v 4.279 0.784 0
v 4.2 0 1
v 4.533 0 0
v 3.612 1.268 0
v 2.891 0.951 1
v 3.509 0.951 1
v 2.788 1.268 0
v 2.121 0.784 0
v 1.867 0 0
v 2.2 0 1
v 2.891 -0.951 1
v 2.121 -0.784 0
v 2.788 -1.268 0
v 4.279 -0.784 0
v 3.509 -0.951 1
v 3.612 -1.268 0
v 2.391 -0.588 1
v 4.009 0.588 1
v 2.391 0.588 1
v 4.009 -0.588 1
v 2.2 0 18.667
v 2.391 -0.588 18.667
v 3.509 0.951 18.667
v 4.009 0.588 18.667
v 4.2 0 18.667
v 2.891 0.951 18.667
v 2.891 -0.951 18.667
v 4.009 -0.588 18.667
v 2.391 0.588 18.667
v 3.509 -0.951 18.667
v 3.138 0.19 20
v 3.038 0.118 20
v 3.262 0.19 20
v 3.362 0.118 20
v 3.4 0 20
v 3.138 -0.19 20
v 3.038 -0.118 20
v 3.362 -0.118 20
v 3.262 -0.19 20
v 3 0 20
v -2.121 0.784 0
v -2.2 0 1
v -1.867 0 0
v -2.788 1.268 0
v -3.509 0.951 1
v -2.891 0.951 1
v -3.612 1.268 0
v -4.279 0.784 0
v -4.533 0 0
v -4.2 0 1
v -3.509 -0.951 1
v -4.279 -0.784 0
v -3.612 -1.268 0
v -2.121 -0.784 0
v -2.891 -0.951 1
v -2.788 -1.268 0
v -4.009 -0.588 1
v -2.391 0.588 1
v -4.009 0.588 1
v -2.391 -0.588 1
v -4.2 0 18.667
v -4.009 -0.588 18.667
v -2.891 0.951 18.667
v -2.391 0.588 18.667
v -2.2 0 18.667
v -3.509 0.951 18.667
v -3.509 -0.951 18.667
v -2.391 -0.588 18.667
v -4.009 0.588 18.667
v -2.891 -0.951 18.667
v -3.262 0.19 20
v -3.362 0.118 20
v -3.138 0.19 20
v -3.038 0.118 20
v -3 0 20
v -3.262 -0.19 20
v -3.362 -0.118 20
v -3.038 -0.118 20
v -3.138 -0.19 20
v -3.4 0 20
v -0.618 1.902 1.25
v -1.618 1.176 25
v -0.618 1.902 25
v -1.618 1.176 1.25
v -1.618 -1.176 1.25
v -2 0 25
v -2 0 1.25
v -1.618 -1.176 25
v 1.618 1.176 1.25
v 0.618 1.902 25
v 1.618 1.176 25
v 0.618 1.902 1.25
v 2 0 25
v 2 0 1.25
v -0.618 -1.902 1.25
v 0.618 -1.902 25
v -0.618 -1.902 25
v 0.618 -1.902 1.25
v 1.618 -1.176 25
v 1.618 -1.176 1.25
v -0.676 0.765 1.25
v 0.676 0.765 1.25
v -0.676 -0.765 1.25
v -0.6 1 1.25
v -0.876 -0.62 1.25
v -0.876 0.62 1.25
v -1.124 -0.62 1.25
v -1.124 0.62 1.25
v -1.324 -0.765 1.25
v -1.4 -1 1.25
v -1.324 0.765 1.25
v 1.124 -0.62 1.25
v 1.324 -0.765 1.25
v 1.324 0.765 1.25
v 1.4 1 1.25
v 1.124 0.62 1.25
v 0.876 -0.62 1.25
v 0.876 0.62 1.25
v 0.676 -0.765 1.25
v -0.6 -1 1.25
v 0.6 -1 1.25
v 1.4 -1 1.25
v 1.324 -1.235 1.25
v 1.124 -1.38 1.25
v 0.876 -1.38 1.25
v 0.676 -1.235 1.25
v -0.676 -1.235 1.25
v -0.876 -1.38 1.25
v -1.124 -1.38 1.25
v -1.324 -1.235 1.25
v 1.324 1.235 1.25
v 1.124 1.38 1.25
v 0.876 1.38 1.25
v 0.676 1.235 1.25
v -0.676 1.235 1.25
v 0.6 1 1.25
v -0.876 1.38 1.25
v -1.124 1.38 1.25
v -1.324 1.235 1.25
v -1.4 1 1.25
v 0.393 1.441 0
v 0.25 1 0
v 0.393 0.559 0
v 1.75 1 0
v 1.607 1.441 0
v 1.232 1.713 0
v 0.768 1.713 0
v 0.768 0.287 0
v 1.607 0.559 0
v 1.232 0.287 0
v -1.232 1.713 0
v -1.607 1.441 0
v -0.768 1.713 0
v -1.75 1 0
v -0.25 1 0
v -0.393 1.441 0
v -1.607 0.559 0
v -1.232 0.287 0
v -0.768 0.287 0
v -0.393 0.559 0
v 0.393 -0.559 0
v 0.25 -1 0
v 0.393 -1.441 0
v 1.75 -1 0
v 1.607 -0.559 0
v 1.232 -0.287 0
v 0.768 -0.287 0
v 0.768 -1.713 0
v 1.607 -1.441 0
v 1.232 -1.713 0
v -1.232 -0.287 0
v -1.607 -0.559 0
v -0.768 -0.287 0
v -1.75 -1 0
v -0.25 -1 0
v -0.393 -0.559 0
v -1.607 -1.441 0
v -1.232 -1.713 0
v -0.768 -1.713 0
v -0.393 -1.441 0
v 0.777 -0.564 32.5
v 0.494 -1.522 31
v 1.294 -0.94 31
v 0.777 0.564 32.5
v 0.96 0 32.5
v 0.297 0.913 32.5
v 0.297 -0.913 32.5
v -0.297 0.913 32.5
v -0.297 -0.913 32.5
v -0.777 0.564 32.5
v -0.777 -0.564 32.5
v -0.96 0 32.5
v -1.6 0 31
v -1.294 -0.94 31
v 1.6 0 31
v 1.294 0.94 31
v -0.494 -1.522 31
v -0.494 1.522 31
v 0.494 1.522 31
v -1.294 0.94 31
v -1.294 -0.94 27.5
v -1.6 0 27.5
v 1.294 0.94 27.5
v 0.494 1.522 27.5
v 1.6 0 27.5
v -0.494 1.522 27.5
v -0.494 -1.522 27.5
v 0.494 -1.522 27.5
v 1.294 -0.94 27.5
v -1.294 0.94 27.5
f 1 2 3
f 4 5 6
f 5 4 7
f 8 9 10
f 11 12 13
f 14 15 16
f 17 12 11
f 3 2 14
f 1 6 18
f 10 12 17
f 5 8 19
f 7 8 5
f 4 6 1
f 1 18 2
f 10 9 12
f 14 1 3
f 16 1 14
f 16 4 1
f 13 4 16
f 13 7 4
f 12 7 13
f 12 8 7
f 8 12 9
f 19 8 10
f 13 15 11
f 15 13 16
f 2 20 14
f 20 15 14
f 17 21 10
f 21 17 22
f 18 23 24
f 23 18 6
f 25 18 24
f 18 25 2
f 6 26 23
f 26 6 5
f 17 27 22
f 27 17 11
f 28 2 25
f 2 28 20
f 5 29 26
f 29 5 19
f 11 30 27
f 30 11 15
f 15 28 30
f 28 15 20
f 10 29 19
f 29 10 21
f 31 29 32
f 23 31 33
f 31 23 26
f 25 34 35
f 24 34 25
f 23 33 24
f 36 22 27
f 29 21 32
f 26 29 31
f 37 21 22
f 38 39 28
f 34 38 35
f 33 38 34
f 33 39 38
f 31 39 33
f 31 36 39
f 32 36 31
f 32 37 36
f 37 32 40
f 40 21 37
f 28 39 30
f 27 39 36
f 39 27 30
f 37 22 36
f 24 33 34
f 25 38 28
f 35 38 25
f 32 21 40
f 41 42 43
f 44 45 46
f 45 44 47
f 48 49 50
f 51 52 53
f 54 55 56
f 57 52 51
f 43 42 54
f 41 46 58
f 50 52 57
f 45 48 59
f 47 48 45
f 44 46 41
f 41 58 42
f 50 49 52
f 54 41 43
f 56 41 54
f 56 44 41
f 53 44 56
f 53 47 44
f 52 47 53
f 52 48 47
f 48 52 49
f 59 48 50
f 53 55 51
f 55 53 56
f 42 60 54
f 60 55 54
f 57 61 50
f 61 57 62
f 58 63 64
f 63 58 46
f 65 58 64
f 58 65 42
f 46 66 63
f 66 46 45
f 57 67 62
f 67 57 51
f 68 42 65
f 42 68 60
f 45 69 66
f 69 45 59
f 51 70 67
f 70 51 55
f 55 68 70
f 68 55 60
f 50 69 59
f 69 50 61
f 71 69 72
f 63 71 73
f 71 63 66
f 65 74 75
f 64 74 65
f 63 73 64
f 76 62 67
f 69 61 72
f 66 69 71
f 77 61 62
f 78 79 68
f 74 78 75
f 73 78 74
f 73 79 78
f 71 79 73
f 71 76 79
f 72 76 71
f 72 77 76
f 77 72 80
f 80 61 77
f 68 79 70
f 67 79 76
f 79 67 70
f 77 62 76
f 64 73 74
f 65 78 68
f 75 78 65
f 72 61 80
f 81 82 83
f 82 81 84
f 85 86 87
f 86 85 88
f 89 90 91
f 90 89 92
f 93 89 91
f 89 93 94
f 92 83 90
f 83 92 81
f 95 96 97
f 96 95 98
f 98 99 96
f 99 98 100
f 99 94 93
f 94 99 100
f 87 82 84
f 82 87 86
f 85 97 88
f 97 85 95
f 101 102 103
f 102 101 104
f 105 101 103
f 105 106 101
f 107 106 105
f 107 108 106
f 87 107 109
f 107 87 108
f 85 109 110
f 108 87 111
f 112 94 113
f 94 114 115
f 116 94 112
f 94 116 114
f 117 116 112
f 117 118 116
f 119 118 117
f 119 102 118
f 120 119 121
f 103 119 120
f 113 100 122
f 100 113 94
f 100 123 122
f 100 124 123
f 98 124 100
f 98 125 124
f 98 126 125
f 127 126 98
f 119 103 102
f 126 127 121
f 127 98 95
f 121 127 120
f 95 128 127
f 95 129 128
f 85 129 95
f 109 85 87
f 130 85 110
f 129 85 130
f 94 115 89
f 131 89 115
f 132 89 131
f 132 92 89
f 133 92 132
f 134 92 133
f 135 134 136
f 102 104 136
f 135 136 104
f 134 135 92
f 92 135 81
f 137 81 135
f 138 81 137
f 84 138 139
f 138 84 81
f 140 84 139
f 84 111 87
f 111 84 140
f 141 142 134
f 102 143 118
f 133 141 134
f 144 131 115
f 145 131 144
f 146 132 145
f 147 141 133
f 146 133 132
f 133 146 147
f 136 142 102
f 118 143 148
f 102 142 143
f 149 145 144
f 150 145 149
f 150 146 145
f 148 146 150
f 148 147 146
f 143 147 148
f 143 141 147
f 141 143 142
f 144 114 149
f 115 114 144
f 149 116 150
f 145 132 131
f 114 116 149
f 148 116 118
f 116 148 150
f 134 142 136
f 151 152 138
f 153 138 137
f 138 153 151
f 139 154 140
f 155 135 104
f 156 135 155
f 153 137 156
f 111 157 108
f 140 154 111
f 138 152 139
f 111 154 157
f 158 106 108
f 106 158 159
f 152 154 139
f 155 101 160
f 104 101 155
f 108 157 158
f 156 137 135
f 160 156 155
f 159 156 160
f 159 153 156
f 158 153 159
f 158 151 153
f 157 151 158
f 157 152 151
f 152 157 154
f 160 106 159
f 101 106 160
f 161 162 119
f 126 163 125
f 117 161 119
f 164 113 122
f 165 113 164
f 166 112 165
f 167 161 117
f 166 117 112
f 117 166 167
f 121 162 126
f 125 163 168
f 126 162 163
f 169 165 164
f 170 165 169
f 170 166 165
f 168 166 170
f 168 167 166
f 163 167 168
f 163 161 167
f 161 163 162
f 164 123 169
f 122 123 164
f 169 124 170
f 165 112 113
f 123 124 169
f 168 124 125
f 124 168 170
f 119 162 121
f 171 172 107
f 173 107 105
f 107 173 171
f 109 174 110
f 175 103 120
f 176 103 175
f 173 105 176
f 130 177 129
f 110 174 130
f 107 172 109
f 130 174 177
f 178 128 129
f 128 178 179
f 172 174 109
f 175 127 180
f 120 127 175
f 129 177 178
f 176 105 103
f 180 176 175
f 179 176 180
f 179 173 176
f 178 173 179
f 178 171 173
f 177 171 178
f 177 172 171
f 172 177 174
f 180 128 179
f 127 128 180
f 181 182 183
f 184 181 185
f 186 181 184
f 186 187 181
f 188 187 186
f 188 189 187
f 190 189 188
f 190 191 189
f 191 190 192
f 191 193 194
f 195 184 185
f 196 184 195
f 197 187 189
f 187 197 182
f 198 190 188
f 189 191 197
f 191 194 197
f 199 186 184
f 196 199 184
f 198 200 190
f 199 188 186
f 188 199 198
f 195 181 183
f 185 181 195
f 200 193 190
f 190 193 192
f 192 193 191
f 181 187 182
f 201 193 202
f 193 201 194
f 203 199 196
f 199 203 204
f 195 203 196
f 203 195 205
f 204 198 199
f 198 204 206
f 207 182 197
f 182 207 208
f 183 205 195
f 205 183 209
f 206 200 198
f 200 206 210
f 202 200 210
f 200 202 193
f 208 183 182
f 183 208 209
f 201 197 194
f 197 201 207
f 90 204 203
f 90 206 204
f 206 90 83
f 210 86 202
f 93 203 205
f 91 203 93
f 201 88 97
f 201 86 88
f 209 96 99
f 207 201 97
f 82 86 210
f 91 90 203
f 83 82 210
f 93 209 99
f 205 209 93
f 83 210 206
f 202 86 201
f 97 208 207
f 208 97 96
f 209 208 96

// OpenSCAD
$fn = 10;

module booster(h, r) {
// cone + tube + cone
 booster_bottom_h = h/20;
 booster_pointy_h = h/15;
 tube_h = h - booster_bottom_h - booster_pointy_h;
 
 union(){
 color("grey")
 cylinder(booster_bottom_h,r+r/3,r); 
 
 color("white") 
 translate([0,0,booster_bottom_h])
 cylinder(tube_h,r,r);
 
 color("white")
 translate([0,0,booster_bottom_h+tube_h])
 cylinder(booster_pointy_h, r, r*0.2);
 }
};

module core_orion_connector(h, r1, r2){
   color("darkorange")
   cylinder(h, r1, r2);
}

module core_stage(h, r) {
 // motors + fuel cylinder
 motors_h = h/20;
 pre_motors_h = h/10;
 core_tube_h = h - motors_h - pre_motors_h;
 
 translate([0,0,motors_h])
 union(){
 translate([0,0,pre_motors_h]){
 color("orange")
 cylinder(core_tube_h,r,r);
 }
 color("white")
 cylinder(pre_motors_h, r,r);
 }
 
 // 4x engines
 union(){
 translate([r/2,r/2,0])
 rs_25_engine(motors_h, r/5);
  translate([-r/2,r/2,0])
 rs_25_engine(motors_h, r/5);
  translate([r/2,-r/2,0])
 rs_25_engine(motors_h, r/5);
  translate([-r/2,-r/2,0])
 rs_25_engine(motors_h, r/5);
 }
};

module rs_25_engine(h,r) {
   color([0.2,0.2,0.2])
   cylinder(h,r+0.35,r);
};

module orion(h,r1,r2) {
  orion_conn_h = h*0.3;
  orion_base_h = h - orion_conn_h;
  
  color("white")
  union(){
    translate([0,0,orion_base_h])
    cylinder(orion_conn_h, r1,r2);
    cylinder(orion_base_h,r1,r1);
  }
};

core_h=25;
core_r = 2;

core_orion_h = core_h * 0.1;
core_orion_r1 = core_r;
core_orion_r2 = core_r*0.8;

orion_h = core_h*0.2;
orion_r1 = core_orion_r2;
orion_r2 = core_orion_r2*0.6;

translate([0,0,$t*50])
union(){
translate([3.2,0,0])
booster(20,1);

translate([-3.2,0,0])
booster(20,1);

core_stage(core_h,core_r);

translate([0,0,core_h])
core_orion_connector(core_orion_h,core_orion_r1, core_orion_r2);

translate([0,0,core_h + core_orion_h])
orion(orion_h, orion_r1, orion_r2);
}
